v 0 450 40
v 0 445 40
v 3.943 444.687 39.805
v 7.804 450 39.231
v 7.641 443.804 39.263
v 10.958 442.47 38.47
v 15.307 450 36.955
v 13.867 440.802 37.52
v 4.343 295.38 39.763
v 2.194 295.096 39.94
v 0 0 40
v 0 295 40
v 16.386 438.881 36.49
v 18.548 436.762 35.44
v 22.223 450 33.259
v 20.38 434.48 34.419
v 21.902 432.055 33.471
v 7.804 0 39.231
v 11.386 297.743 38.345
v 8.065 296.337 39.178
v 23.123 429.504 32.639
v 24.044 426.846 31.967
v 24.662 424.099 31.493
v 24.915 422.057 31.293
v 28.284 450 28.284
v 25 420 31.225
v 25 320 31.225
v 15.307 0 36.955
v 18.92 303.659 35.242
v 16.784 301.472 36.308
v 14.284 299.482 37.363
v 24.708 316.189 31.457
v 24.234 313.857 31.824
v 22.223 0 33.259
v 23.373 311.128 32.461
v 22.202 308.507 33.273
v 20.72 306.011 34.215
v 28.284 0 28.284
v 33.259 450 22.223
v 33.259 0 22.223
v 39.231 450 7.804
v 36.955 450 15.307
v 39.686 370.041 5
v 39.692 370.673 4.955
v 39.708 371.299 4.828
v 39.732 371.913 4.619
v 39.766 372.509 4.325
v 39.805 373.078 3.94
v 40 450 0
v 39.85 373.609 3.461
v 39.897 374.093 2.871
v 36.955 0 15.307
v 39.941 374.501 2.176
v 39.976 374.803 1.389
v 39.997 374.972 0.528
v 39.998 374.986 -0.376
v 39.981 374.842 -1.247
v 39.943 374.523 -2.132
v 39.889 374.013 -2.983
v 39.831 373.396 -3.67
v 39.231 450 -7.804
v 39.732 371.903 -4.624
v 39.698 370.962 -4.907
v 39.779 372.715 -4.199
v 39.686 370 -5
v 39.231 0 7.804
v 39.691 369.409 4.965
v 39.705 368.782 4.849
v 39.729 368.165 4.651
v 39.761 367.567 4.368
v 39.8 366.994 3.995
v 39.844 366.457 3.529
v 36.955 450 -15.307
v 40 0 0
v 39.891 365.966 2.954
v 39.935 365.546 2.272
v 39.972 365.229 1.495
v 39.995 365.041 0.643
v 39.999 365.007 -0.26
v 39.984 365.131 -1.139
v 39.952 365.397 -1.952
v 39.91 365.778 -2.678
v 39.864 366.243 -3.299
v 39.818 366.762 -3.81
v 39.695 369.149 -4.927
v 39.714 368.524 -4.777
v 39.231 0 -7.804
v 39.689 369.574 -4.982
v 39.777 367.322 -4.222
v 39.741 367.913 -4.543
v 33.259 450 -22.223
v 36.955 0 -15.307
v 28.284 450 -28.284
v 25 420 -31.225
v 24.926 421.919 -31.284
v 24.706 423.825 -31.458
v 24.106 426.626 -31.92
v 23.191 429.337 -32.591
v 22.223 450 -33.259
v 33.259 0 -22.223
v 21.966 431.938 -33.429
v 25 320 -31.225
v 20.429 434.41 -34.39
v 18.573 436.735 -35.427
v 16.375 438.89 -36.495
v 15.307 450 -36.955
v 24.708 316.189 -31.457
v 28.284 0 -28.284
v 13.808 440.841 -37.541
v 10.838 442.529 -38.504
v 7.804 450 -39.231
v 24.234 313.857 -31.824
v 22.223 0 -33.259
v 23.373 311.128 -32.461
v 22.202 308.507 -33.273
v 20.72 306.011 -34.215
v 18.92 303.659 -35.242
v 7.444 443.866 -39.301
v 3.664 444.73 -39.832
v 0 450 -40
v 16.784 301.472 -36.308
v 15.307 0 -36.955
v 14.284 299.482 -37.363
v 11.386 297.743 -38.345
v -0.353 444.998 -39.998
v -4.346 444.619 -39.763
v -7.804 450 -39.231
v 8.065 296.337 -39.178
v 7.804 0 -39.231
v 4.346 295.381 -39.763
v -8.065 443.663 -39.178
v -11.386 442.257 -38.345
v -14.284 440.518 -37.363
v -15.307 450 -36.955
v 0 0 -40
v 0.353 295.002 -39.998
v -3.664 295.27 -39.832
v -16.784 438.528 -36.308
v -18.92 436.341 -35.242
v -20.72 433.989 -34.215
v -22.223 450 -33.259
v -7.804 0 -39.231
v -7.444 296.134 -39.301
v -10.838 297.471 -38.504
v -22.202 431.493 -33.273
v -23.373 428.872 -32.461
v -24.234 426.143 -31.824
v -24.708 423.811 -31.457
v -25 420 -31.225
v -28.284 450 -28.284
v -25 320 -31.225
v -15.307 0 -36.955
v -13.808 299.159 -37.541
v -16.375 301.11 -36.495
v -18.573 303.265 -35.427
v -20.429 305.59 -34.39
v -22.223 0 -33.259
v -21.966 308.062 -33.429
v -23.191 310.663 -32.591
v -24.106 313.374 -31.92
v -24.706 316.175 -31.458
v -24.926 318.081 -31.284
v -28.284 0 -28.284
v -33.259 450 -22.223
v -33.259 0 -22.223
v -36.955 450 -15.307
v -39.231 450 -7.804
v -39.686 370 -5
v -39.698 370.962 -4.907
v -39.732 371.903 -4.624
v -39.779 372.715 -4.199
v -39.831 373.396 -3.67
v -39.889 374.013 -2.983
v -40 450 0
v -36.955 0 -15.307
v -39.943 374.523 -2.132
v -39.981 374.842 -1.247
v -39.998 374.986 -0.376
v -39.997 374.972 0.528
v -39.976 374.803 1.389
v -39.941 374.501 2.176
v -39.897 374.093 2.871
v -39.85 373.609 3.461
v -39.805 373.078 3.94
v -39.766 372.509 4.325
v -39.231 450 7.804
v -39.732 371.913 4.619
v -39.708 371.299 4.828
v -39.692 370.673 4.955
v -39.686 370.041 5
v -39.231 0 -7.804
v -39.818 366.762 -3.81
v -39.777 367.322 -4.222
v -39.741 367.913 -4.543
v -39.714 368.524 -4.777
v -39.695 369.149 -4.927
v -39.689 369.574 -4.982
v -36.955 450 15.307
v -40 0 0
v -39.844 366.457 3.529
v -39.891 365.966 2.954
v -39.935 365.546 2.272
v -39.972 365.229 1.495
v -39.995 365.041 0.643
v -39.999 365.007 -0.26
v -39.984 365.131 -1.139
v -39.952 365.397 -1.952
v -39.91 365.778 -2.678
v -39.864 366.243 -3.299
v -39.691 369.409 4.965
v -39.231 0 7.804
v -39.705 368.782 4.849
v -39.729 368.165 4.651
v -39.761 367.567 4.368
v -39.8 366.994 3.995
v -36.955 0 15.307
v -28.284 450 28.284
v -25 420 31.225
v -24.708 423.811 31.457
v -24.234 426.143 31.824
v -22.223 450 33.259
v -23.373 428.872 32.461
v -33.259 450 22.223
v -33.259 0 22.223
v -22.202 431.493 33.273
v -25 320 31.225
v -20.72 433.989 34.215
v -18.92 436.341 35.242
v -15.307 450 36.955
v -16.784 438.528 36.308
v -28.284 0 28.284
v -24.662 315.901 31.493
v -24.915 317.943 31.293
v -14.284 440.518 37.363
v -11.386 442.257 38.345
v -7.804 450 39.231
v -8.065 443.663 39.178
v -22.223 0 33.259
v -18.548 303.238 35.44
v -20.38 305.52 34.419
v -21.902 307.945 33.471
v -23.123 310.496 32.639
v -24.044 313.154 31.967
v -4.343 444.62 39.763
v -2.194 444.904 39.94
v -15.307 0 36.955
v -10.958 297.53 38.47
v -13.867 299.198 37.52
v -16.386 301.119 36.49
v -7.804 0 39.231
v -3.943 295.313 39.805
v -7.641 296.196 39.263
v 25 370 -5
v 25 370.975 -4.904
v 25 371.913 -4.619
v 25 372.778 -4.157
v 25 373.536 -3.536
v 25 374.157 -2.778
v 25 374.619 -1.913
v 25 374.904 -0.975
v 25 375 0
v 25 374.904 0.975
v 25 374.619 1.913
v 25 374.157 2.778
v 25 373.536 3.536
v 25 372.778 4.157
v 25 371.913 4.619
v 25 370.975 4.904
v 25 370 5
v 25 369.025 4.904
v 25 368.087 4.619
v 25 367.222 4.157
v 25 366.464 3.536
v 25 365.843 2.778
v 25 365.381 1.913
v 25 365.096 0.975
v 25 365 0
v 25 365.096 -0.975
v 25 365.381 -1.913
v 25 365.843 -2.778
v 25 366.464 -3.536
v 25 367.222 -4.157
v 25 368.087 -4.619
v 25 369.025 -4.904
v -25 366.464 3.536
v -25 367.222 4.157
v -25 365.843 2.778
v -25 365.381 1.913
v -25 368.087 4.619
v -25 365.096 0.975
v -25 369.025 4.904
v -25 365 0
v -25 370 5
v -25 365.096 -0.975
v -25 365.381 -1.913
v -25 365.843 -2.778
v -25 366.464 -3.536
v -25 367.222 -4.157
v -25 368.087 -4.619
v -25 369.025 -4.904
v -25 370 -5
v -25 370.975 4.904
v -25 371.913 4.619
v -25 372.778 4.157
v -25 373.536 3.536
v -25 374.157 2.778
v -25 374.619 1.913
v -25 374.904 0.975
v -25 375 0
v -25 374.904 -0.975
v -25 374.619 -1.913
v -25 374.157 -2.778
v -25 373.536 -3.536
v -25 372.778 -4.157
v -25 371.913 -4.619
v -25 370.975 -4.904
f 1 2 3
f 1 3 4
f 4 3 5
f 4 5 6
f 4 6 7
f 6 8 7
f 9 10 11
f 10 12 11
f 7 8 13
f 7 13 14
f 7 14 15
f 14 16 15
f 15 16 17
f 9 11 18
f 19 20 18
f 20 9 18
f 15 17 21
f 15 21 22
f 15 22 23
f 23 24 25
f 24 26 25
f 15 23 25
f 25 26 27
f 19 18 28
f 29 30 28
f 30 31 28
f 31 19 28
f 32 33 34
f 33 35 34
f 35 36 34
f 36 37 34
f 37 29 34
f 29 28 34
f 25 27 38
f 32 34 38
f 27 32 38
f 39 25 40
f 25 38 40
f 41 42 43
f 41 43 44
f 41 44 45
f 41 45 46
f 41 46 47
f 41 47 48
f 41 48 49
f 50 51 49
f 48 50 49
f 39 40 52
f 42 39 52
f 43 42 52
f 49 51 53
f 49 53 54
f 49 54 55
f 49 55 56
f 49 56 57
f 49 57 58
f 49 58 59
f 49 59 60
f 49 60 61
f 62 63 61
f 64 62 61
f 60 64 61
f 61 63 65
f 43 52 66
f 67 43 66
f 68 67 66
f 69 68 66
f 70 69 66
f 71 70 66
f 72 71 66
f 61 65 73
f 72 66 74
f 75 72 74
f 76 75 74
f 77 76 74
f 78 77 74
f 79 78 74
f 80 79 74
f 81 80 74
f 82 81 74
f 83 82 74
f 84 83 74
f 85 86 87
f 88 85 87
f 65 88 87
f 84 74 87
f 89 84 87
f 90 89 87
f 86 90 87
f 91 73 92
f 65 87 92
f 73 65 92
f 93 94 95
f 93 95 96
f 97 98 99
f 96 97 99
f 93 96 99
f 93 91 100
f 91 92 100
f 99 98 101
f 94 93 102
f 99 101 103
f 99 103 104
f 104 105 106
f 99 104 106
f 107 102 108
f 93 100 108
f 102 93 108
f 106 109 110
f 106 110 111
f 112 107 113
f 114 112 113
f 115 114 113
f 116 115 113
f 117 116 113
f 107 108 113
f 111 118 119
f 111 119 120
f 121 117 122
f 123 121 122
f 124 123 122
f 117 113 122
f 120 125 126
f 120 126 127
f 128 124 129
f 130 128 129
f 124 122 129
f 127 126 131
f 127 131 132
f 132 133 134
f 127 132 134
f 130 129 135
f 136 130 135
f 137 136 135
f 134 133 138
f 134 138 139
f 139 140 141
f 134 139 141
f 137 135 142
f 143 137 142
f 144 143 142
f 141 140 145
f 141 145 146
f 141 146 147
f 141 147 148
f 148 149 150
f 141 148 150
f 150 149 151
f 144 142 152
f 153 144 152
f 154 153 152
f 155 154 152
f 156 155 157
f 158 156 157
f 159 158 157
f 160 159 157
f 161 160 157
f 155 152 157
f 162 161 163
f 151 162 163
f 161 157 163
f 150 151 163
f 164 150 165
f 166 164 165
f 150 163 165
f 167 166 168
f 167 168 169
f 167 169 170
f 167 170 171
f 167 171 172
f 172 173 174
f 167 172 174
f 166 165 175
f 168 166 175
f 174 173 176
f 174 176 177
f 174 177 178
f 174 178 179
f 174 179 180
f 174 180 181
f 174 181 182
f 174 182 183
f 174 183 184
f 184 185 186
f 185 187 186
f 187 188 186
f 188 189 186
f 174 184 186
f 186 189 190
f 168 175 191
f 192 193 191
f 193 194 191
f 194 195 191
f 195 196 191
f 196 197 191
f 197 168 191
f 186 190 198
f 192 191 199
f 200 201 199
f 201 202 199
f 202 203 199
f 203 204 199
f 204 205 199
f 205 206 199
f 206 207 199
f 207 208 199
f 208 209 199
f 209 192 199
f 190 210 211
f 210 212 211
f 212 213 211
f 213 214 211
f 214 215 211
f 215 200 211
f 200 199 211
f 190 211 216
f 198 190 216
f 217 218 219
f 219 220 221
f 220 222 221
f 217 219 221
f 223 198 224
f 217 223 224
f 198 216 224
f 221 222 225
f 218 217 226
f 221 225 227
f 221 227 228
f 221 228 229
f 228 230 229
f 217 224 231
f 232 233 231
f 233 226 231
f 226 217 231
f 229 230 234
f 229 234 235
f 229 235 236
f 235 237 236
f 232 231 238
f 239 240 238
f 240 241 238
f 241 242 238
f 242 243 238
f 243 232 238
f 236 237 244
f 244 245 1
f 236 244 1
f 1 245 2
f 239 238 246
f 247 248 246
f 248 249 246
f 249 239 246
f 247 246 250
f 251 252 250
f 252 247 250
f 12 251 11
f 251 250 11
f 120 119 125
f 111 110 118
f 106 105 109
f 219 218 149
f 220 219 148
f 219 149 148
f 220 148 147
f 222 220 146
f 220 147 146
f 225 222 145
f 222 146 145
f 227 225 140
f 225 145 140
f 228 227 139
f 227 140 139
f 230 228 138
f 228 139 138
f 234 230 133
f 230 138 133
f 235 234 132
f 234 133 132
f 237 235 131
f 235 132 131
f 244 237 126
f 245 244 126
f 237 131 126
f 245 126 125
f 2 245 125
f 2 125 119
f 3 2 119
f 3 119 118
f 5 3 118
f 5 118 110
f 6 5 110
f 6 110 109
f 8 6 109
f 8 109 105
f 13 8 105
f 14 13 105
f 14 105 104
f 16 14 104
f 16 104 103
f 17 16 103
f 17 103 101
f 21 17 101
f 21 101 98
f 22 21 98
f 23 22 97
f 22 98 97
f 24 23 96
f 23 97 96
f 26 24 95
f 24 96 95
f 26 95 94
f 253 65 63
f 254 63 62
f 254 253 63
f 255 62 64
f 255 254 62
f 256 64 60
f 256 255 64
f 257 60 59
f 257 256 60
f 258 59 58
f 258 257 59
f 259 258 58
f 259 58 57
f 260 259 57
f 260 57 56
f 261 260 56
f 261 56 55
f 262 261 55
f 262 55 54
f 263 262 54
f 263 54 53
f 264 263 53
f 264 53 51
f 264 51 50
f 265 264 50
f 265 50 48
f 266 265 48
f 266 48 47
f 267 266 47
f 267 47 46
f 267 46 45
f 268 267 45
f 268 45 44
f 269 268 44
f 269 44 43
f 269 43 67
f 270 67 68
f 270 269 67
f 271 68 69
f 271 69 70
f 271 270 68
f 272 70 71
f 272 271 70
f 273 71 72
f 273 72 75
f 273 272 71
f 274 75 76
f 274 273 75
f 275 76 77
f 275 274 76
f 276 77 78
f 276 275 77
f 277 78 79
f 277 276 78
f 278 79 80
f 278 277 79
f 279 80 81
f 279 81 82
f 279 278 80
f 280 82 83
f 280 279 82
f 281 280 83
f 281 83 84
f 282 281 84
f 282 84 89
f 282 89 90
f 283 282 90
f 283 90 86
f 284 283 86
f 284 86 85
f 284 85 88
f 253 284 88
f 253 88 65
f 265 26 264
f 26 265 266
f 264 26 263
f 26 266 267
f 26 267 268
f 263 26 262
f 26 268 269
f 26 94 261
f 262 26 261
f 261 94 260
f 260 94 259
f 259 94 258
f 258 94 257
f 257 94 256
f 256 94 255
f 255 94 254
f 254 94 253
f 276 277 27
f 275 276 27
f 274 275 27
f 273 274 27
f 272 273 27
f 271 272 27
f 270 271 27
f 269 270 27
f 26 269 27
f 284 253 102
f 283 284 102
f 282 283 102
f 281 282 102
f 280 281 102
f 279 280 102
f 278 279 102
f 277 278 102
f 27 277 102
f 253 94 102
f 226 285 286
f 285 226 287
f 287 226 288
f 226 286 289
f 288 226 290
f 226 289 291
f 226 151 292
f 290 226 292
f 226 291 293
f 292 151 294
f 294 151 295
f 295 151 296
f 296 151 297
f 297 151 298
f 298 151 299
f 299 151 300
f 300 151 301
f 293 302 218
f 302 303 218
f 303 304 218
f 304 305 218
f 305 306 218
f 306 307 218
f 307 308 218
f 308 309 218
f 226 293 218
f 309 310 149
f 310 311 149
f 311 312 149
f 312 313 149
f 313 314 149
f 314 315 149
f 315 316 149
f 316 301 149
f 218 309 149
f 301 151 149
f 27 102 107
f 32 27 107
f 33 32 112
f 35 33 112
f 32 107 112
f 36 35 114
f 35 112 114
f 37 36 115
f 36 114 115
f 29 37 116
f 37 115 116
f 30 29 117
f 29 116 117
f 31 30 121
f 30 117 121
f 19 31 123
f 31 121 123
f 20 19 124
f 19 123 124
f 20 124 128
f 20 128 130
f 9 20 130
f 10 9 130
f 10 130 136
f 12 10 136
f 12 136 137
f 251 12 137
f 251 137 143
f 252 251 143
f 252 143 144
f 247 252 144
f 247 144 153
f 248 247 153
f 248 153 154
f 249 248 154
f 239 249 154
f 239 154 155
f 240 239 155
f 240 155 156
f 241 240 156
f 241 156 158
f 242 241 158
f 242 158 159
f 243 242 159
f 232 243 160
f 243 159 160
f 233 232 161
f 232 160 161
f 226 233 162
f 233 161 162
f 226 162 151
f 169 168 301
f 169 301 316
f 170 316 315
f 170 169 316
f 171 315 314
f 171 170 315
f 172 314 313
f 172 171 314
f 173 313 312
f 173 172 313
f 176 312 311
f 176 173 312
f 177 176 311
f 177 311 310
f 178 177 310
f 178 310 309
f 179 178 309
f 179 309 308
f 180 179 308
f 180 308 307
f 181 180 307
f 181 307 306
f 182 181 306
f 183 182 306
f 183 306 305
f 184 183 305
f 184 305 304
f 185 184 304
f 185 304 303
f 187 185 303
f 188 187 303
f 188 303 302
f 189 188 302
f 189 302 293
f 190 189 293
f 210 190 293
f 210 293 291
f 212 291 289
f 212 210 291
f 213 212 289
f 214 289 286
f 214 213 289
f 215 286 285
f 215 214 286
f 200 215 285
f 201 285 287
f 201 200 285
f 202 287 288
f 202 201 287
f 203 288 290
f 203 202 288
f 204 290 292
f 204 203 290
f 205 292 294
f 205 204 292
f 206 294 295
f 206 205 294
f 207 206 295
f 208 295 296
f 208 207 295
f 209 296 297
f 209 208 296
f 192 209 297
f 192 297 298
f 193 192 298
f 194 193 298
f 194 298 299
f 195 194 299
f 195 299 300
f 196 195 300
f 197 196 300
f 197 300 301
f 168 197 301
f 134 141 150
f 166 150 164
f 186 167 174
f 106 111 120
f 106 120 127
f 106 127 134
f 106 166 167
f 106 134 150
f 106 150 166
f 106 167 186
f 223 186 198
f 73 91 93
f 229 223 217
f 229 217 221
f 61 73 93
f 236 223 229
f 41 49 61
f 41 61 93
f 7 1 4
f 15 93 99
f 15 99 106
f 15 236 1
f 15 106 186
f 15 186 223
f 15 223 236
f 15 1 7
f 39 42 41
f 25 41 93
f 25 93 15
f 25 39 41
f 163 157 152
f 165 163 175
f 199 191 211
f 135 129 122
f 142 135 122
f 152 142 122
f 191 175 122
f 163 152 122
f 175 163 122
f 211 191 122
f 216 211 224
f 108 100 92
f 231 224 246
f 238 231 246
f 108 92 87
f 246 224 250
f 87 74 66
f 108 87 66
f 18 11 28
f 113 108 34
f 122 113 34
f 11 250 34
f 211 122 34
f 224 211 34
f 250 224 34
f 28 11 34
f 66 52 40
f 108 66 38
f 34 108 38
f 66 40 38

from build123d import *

# Parameters (mm, degrees)
SKETCH1_R               = 40
BOSS_EXTRUDE1_DEPTH     = 450
CUT_EXTRUDE1_DEPTH      = 454.541618818
CUT_EXTRUDE1_DEPTH_BACK = 454.541618818
CUT_EXTRUDE2_DEPTH      = 454.541618935
CUT_EXTRUDE2_DEPTH_BACK = 454.541618935
SKETCH3_R               = 5


with BuildPart() as part:
    # Sketch1 → Boss-Extrude1 (new body)
    with BuildSketch(Plane(origin=(0, 0, 0), x_dir=(1, 0, 0), z_dir=(0, 1, 0))):
        with Locations(Location((0, 0, 0), (0, 0, 270))):
            Circle(SKETCH1_R)
    extrude(amount=BOSS_EXTRUDE1_DEPTH)

    # Sketch2 → Cut-Extrude1 (cut, two sides: drawn at the far end of the back side and taken through both)
    with BuildSketch(Plane.XY.offset(-CUT_EXTRUDE1_DEPTH_BACK)):
        with BuildLine():
            Line((25, 420), (25, 320))
            ThreePointArc((25, 320), (0, 295), (-25, 320))
            Line((-25, 320), (-25, 420))
            ThreePointArc((-25, 420), (0, 445), (25, 420))
        make_face()
    extrude(amount=CUT_EXTRUDE1_DEPTH + CUT_EXTRUDE1_DEPTH_BACK, mode=Mode.SUBTRACT)

    # Sketch3 → Cut-Extrude2 (cut, two sides: drawn at the far end of the back side and taken through both)
    with BuildSketch(Plane(origin=(0, 0, 0), x_dir=(0, 0, -1), z_dir=(1, 0, 0)).offset(-CUT_EXTRUDE2_DEPTH_BACK)):
        with Locations((0, 370)):
            Circle(SKETCH3_R)
    extrude(amount=CUT_EXTRUDE2_DEPTH + CUT_EXTRUDE2_DEPTH_BACK, mode=Mode.SUBTRACT)


solid = part.part
